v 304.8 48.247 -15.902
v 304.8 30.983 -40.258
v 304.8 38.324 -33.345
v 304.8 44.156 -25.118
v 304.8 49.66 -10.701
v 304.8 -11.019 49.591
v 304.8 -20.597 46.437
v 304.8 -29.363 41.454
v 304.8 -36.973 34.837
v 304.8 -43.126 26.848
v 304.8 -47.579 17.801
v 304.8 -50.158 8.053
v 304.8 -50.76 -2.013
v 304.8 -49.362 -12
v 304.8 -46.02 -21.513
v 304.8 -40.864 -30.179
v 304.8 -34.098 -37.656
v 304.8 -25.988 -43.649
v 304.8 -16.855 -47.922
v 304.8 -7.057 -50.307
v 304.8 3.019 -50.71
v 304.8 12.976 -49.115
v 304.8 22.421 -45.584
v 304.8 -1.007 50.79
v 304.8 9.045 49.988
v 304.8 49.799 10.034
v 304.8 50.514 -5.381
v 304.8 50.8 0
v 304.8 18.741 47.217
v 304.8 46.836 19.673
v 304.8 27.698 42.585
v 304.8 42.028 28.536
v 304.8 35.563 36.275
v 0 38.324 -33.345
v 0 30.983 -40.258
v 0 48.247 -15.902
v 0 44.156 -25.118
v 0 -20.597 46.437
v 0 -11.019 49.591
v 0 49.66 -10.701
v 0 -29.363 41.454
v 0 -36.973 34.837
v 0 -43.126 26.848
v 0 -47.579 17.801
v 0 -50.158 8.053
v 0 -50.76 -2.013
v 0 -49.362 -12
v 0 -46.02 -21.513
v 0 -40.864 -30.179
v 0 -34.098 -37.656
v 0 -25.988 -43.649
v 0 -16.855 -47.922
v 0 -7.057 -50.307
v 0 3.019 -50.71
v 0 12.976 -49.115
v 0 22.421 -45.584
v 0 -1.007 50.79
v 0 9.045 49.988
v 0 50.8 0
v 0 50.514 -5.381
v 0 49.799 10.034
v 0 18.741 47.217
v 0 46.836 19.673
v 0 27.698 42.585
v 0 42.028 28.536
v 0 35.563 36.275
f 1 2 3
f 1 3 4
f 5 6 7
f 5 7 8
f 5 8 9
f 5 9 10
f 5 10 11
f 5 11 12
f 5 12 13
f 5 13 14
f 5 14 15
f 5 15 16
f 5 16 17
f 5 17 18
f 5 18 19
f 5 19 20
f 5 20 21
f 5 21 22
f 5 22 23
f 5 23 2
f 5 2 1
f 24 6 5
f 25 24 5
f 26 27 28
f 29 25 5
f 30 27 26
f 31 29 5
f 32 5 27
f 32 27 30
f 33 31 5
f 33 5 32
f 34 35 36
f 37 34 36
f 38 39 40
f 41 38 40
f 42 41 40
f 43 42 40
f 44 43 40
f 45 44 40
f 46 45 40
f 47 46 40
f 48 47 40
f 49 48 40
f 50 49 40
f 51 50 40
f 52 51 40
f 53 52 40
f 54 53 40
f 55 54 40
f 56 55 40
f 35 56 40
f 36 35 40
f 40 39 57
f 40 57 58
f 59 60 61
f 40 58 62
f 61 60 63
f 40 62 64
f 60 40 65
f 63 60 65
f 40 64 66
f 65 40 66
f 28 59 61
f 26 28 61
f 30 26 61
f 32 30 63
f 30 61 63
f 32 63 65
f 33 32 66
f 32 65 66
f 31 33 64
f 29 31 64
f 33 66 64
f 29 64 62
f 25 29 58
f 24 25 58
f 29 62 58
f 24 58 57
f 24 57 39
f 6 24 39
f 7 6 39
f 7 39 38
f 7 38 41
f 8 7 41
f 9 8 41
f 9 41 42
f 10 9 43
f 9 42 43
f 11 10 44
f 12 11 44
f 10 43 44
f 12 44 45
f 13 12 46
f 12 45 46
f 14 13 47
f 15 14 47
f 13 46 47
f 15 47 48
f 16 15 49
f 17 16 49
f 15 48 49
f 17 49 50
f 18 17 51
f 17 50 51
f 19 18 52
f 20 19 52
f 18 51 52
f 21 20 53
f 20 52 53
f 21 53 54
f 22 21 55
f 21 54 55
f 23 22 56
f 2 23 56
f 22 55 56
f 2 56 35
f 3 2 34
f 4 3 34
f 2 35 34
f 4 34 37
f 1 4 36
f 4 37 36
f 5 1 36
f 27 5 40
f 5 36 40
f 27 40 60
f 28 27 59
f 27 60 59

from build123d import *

# Parameters (mm, degrees)
F1_DEPTH = 304.8


with BuildPart() as f1:
    # F0 (on Right) → F1 (new body)
    with BuildSketch(Plane.YZ):
        with BuildLine():
            Line((48.2470816248, -15.901544412), (-48.2470816248, 15.901544412))
            ThreePointArc((-48.2470816248, 15.901544412), (-15.901544412, -48.2470816248), (48.2470816248, -15.901544412))
        make_face()
        with BuildLine():
            ThreePointArc((48.2470816248, -15.901544412), (50.1577100082, -8.052585096), (50.8, 0))
            ThreePointArc((50.8, 0), (8.052585096, 50.1577100082), (-48.2470816248, 15.901544412))
            Line((-48.2470816248, 15.901544412), (48.2470816248, -15.901544412))
        make_face()
    extrude(amount=F1_DEPTH)


with BuildPart() as f2_1:
    # F2: copy of F1
    add(f1.part)


solid = f1.part
